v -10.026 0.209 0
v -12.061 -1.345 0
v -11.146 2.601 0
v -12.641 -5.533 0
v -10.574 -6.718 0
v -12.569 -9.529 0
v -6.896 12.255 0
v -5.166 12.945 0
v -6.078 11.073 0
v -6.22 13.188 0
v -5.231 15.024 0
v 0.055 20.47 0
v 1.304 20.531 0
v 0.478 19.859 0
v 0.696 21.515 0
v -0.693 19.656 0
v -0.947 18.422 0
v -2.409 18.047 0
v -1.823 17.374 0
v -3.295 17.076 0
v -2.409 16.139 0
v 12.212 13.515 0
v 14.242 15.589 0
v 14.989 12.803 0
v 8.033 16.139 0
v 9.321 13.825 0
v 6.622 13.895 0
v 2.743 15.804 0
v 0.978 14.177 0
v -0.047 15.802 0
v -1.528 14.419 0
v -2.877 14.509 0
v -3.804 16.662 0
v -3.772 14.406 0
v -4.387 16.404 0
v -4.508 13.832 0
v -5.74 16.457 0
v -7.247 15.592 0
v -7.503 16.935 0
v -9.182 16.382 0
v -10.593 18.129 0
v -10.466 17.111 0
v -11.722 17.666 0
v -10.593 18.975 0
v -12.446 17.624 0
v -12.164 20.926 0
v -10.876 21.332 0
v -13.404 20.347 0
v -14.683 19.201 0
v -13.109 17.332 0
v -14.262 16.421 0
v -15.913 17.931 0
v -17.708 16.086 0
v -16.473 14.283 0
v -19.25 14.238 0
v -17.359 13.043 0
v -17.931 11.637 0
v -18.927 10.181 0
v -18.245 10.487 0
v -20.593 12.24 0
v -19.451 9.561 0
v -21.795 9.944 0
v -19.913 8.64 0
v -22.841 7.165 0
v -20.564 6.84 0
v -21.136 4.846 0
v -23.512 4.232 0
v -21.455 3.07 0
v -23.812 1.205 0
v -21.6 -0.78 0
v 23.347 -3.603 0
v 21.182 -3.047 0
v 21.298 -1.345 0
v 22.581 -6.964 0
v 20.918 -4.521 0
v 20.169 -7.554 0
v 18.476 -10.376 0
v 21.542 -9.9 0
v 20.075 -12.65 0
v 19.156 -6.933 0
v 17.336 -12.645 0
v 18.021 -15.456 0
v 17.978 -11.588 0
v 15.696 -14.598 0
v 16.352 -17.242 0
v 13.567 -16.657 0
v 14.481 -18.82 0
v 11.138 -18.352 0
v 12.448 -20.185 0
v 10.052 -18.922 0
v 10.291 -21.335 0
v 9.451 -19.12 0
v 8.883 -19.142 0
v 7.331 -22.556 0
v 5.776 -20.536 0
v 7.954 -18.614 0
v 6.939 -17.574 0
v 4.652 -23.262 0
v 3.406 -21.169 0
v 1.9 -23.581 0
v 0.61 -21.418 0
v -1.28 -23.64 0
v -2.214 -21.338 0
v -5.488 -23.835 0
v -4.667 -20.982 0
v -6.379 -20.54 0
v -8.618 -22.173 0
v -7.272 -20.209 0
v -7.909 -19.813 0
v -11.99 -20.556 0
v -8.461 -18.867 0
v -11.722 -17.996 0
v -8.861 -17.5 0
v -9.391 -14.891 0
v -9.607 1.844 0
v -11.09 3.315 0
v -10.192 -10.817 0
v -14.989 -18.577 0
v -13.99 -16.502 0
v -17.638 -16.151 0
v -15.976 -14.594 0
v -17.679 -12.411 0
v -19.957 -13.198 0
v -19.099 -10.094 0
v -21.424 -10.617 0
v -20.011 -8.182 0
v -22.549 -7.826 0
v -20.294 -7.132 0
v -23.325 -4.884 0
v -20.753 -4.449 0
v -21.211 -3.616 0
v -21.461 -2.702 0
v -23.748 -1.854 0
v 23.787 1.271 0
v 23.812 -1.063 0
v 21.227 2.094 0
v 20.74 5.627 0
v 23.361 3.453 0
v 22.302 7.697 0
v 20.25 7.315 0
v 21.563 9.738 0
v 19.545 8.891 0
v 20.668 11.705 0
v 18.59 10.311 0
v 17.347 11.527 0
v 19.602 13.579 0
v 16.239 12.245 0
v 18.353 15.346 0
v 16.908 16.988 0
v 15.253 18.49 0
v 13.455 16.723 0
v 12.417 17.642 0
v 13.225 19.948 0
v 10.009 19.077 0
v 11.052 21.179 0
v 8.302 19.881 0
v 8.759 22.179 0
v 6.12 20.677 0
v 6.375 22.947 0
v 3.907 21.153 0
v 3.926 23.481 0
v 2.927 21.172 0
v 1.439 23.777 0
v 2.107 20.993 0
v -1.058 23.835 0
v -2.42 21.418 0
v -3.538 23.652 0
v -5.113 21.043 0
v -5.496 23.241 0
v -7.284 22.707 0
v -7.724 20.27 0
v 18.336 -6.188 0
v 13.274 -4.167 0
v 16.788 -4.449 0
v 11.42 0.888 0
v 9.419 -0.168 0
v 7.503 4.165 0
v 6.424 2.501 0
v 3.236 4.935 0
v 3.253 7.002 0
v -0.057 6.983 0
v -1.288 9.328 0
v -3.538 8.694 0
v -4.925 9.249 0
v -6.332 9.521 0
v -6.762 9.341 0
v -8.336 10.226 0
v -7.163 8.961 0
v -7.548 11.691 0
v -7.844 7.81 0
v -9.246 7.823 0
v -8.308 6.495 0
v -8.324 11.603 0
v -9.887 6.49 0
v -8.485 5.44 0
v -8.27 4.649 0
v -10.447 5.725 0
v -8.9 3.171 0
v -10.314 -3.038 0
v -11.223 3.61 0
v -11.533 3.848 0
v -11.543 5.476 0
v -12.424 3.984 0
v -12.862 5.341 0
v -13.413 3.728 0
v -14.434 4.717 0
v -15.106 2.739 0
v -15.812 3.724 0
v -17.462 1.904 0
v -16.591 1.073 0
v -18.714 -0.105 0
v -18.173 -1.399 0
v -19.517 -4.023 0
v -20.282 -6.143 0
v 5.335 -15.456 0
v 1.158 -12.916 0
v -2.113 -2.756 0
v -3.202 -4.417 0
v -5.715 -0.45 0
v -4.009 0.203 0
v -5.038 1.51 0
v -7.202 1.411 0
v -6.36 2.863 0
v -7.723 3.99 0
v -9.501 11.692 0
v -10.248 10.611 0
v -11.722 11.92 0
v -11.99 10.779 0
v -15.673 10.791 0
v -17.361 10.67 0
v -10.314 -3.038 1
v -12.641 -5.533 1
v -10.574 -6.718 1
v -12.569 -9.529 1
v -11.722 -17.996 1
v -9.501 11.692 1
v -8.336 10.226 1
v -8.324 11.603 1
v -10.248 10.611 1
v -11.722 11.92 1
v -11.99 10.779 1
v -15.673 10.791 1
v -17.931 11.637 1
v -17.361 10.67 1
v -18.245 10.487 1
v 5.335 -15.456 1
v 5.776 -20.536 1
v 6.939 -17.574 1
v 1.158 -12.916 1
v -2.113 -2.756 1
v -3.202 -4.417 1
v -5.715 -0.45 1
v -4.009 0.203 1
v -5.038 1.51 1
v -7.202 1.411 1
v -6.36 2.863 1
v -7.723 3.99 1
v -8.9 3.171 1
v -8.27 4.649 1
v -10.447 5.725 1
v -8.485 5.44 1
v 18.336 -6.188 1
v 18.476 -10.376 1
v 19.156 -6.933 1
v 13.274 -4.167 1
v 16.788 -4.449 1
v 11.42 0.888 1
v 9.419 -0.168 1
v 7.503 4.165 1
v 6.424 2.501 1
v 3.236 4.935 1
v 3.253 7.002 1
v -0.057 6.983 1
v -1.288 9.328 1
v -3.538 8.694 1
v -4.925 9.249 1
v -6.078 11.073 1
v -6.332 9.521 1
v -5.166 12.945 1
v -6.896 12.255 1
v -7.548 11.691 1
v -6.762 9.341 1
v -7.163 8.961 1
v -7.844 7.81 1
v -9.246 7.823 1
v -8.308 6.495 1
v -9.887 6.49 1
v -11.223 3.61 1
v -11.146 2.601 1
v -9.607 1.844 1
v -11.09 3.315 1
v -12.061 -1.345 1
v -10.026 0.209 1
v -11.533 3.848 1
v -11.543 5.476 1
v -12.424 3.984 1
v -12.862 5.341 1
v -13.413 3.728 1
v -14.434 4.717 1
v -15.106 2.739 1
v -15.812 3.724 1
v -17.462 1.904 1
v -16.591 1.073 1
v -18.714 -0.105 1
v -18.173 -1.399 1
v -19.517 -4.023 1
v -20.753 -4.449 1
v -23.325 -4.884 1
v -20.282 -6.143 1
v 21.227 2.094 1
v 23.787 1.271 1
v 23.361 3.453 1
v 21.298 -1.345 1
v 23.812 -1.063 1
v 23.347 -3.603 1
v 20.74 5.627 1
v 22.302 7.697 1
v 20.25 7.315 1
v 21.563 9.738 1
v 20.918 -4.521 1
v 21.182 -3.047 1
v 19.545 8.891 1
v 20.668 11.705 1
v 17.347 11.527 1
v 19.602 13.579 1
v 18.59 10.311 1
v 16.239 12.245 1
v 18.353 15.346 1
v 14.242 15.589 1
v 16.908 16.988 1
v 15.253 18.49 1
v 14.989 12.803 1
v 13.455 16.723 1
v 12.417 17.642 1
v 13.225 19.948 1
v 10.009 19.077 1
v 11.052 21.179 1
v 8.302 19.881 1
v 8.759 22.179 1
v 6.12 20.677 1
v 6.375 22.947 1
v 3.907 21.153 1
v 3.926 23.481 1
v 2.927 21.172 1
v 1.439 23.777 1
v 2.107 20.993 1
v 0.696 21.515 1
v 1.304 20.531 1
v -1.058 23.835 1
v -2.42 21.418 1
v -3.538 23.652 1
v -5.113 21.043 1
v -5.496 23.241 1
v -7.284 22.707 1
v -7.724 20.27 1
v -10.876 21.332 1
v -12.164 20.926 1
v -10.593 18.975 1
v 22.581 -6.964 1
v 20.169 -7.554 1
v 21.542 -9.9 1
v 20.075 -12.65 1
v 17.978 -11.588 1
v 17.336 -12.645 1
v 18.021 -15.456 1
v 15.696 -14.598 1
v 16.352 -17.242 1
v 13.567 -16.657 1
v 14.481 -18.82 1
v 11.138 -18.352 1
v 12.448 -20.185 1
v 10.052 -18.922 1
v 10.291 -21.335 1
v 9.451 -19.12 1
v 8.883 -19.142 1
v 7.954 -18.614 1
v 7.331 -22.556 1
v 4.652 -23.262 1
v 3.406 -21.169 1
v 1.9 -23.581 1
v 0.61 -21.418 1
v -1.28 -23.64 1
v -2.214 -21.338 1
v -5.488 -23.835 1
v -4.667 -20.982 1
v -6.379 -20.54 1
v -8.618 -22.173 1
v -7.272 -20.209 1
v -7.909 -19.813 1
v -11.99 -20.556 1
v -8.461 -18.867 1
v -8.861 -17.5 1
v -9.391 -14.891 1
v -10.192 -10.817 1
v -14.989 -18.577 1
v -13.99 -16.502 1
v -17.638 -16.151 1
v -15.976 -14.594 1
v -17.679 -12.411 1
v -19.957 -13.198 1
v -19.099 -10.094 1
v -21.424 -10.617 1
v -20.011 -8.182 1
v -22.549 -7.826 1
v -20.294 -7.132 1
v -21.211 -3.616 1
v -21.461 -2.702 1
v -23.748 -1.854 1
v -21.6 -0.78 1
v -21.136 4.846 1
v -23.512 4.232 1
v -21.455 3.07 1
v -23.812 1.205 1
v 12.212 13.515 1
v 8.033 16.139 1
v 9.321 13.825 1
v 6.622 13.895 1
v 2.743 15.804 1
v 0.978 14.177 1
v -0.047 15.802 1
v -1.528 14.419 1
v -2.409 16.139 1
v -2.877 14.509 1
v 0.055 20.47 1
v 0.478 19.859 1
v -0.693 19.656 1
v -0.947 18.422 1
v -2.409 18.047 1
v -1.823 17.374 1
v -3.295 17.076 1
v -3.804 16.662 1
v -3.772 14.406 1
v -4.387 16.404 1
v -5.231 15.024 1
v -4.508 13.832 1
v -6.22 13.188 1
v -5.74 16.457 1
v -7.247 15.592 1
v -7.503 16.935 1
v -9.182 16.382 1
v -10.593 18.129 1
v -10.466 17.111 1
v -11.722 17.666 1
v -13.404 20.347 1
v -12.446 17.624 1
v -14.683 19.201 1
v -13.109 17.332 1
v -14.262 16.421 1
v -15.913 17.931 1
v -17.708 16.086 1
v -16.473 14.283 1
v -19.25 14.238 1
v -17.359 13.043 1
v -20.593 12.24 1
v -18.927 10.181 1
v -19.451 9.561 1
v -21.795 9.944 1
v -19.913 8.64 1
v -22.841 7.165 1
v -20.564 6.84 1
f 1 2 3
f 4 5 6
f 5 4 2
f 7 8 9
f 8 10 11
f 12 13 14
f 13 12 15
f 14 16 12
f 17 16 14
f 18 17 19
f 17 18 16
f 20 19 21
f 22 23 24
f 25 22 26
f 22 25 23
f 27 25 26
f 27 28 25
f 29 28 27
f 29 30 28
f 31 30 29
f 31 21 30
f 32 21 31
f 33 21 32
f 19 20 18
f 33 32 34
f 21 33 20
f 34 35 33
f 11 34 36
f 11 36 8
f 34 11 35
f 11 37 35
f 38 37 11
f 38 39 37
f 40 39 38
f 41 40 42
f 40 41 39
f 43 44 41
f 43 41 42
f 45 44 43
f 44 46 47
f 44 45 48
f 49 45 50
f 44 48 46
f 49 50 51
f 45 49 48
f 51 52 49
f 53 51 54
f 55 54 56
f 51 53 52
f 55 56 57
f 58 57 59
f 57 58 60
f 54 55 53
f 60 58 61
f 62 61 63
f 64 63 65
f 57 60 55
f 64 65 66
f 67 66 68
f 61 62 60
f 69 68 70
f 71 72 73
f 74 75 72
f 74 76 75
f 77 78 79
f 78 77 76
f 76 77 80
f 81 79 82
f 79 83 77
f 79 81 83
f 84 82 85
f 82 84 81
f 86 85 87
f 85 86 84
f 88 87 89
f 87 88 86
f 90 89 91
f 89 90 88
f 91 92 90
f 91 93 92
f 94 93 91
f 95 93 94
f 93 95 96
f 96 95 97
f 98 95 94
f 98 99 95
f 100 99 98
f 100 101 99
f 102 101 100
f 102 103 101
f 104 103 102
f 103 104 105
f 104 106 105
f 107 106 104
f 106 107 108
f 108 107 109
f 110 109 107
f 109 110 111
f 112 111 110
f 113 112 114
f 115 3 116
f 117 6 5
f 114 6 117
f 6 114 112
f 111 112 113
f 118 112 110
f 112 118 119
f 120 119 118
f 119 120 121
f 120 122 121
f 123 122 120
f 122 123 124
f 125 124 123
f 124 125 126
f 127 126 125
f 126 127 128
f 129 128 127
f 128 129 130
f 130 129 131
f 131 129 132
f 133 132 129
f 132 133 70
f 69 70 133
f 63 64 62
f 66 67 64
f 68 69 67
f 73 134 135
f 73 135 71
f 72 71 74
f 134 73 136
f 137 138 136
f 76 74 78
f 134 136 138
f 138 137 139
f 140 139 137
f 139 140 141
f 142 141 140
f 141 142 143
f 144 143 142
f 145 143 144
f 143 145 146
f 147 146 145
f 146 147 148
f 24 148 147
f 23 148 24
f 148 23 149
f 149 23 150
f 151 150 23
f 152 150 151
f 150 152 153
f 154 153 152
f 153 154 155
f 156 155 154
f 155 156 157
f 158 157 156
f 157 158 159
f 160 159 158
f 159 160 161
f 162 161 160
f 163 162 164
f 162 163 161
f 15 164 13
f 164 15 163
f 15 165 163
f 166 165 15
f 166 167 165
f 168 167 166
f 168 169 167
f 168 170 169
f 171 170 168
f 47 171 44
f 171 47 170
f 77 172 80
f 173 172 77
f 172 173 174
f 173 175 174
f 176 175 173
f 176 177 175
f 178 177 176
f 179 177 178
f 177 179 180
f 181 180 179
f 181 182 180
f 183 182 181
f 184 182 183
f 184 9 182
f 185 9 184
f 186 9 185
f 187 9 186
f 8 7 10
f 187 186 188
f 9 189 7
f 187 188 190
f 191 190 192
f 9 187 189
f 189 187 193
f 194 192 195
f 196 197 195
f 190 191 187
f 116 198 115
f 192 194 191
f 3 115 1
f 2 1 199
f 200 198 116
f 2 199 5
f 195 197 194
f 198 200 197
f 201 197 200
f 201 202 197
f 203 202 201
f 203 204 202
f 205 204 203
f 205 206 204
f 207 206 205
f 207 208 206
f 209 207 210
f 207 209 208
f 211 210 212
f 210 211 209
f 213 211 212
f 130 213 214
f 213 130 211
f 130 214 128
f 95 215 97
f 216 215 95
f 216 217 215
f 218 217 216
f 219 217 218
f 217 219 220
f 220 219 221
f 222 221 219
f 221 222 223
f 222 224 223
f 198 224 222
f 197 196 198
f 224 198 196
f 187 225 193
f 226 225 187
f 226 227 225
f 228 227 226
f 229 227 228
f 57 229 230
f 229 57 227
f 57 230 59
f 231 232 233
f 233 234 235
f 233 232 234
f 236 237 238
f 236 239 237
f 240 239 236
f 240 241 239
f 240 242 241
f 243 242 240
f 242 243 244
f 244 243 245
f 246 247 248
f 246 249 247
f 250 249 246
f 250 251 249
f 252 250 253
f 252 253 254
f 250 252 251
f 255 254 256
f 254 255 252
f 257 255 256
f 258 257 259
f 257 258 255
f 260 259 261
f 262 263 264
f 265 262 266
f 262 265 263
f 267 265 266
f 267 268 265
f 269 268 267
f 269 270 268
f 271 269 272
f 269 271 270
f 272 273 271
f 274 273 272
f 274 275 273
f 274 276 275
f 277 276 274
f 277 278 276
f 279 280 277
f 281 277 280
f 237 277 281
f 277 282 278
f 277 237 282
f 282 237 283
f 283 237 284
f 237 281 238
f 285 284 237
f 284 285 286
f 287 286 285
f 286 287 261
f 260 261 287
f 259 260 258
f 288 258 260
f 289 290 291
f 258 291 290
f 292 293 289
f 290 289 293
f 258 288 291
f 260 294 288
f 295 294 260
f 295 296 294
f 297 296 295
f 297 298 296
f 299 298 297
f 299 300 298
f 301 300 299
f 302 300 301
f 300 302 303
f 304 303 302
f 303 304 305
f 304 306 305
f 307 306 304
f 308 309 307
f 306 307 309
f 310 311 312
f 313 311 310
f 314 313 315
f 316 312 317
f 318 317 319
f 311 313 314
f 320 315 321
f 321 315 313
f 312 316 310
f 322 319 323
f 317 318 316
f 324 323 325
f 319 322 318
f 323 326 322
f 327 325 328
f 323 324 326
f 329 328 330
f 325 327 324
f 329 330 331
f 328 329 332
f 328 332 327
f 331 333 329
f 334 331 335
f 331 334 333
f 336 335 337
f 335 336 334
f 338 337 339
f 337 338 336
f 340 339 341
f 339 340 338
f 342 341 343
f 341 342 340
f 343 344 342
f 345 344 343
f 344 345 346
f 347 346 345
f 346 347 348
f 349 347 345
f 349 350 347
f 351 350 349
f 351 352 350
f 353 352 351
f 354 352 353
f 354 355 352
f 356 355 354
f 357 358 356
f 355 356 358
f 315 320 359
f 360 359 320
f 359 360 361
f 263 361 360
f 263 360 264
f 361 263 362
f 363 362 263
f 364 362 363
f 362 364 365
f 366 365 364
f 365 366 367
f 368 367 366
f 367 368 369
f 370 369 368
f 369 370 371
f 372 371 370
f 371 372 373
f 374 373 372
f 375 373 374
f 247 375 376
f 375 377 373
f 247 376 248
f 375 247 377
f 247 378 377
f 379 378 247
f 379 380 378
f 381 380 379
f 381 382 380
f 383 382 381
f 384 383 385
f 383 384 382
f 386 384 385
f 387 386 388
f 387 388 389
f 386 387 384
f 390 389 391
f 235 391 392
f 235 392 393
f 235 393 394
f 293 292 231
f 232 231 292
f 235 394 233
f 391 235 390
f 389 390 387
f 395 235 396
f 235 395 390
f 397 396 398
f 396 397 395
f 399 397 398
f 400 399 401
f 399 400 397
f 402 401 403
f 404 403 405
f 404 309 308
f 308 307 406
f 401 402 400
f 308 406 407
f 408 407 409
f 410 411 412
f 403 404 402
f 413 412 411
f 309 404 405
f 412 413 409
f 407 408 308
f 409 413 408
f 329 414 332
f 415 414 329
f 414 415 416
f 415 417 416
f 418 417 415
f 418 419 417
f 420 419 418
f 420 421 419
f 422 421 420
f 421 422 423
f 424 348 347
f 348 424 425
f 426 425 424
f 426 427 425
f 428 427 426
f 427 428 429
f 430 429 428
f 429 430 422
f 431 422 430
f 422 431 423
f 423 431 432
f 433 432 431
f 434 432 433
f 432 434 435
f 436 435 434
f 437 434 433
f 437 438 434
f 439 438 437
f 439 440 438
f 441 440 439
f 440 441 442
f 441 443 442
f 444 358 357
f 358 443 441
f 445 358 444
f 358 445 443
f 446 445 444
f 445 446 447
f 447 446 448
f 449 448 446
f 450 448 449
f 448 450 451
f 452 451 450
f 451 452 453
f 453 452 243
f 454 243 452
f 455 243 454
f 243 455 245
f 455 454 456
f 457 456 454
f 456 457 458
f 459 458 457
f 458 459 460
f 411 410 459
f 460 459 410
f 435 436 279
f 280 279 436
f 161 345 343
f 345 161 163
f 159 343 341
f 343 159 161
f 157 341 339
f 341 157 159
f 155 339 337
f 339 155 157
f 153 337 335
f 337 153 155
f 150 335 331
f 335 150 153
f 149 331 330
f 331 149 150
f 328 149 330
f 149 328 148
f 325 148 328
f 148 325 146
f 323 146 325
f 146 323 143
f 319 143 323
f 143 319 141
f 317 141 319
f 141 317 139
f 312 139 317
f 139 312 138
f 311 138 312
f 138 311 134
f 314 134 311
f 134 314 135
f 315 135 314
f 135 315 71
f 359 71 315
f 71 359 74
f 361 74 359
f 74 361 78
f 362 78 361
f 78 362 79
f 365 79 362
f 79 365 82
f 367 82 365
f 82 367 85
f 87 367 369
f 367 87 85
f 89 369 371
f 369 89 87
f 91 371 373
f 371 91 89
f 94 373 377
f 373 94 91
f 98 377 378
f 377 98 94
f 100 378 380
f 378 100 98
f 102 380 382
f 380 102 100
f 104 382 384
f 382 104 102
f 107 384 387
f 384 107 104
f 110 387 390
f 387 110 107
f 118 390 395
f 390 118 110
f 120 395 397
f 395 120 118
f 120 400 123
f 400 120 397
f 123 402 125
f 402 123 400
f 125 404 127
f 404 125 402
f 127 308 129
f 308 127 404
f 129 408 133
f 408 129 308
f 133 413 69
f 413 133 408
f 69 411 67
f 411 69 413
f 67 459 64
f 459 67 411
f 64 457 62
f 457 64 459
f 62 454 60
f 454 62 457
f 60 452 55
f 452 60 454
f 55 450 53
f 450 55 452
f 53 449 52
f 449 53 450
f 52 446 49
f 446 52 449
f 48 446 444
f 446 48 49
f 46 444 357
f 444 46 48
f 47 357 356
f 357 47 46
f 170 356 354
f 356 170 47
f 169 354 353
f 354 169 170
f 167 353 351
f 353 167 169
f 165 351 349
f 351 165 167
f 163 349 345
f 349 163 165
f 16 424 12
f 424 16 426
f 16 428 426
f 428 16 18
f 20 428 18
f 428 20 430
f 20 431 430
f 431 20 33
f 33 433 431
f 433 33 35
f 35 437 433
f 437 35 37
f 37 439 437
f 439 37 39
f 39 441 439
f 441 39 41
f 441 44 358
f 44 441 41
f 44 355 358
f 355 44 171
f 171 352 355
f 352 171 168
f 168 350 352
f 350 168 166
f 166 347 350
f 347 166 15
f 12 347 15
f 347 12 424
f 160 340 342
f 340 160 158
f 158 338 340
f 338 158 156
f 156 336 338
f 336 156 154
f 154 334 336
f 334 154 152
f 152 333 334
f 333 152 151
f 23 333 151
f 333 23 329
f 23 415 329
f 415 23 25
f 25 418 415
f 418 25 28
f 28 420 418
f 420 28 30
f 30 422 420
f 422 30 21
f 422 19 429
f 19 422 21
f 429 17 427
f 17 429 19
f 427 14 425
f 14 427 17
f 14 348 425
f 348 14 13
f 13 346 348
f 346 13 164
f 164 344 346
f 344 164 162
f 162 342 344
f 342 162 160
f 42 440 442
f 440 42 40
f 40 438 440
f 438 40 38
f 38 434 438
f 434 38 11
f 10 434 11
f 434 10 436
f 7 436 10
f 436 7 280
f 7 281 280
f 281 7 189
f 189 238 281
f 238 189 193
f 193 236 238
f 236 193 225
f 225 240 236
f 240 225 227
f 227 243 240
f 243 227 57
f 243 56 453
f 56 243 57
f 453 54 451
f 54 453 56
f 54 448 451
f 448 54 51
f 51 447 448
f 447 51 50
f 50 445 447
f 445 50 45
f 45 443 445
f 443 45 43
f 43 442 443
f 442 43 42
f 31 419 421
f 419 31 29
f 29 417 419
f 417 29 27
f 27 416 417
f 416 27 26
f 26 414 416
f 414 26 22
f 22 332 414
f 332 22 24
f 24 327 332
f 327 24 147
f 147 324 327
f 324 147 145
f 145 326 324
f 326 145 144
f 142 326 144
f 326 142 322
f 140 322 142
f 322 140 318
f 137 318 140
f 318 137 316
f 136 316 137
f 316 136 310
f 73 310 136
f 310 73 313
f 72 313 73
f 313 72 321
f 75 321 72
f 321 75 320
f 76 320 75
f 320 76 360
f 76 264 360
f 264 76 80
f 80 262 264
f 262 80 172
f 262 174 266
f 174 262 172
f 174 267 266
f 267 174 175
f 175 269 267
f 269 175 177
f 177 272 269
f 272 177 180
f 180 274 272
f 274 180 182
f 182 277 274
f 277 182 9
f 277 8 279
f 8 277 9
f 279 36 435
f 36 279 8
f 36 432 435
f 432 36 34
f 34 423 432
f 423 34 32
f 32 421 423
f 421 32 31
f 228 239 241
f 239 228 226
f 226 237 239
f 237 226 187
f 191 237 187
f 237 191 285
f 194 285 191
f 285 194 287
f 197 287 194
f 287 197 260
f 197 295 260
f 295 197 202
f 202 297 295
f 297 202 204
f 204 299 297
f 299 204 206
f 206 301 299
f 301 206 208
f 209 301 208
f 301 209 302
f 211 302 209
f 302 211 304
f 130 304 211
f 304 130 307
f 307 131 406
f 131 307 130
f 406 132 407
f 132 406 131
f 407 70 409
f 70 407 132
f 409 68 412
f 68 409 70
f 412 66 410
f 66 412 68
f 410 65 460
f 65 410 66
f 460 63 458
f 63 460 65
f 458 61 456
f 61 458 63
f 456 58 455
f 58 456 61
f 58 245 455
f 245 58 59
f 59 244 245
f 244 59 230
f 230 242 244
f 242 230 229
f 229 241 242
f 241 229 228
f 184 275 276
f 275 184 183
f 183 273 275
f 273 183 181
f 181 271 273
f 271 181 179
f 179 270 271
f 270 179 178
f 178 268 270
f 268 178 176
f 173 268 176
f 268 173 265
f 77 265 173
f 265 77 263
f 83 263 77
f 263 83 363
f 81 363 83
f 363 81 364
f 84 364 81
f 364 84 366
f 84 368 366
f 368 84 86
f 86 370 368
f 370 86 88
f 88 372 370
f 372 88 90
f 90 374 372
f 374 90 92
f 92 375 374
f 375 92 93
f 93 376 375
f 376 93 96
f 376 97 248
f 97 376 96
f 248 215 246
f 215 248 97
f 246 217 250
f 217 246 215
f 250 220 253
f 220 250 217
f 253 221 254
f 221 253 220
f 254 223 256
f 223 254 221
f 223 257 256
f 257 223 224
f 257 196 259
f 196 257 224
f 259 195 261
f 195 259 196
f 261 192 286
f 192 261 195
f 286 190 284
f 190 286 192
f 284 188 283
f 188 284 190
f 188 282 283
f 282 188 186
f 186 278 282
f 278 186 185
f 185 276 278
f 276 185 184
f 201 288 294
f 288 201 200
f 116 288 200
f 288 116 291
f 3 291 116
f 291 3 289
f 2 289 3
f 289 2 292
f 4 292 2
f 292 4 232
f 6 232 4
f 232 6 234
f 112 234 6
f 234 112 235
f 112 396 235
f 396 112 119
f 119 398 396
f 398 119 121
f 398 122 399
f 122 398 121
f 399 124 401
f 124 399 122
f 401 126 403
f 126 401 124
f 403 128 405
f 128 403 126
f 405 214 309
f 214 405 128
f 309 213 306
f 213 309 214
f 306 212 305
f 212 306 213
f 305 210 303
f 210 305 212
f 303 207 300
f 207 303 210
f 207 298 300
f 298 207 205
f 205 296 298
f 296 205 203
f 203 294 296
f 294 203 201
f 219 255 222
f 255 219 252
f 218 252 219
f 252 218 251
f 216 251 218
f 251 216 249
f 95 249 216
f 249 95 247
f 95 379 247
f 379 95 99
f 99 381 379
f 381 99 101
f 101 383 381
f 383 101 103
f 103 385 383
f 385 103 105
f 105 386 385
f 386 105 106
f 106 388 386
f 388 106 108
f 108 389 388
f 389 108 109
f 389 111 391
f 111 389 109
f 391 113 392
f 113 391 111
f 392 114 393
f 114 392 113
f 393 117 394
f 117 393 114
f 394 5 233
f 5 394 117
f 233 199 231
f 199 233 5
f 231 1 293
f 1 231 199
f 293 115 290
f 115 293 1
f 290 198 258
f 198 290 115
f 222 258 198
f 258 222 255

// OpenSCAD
// Module names are of the form poly_<inkscape-path-id>().  As a result,
// you can associate a polygon in this OpenSCAD program with the corresponding
// SVG element in the Inkscape document by looking for the XML element with
// the attribute id="inkscape-path-id".

// fudge value is used to ensure that subtracted solids are a tad taller
// in the z dimension than the polygon being subtracted from.  This helps
// keep the resulting .stl file manifold.
fudge = 0.1;

module poly_Selection(h)
{
  scale([25.4/90, -25.4/90, 1]) union()
  {
    difference()
    {
       linear_extrude(height=h)
         polygon([[54.044688,-65.514971],[59.909023,-60.194951],[65.030625,-54.376064],[69.456133,-48.116318],[73.232187,-41.473721],[76.405430,-34.506279],[79.022500,-27.272002],[82.774688,-12.234971],[84.283438,-4.504971],[84.374688,3.765029],[82.724688,12.765029],[80.011094,24.676904],[76.330937,35.077529],[71.130156,44.821904],[63.854687,54.765029],[57.939531,61.095186],[51.310937,66.683779],[44.106719,71.520498],[36.464688,75.595029],[25.974688,79.923154],[16.482187,82.425029],[6.730938,83.554404],[-4.535312,83.765029],[-19.445312,84.455029],[-30.535312,78.565029],[-42.484844,72.836904],[-53.111562,65.822529],[-62.495156,57.229404],[-70.715312,46.765029],[-75.912812,37.619990],[-79.897187,27.728467],[-82.648750,17.305850],[-84.147812,6.567529],[-84.374687,-4.271104],[-83.309687,-14.994658],[-80.933125,-25.387744],[-77.225312,-35.234971],[-72.967812,-43.369346],[-68.207812,-50.449971],[-62.746562,-56.998096],[-56.385312,-63.534971],[-52.026562,-68.036221],[-47.495312,-72.094971],[-43.101562,-74.147471],[-38.535312,-75.584971],[-25.809062,-80.456221],[-19.473594,-82.350439],[-12.535312,-83.804971],[-3.747285,-84.455029],[5.100156,-84.250439],[13.910801,-83.199053],[22.588438,-81.308721],[31.036855,-78.587295],[39.159844,-75.042627],[46.861191,-70.682568],[54.044688,-65.514971]]);
       translate([0, 0, -fudge])
         linear_extrude(height=h+2*fudge)
           polygon([[-37.535312,-67.234971],[-37.535312,-64.234971],[-26.585313,-60.006221],[-20.339687,-58.313252],[-15.545312,-58.124971],[-13.478281,-59.038564],[-11.676563,-60.506221],[-8.535312,-63.944971],[-2.454062,-69.647471],[0.193281,-72.531533],[2.464688,-76.234971],[-8.573594,-75.889033],[-18.116563,-74.562471],[-27.368906,-71.822158],[-37.535312,-67.234971]]);
       translate([0, 0, -fudge])
         linear_extrude(height=h+2*fudge)
           polygon([[35.464688,-67.594971],[29.417656,-70.443252],[21.685938,-73.266221],[13.843594,-74.951064],[10.372832,-75.018936],[7.464688,-74.384971],[4.620938,-72.749189],[1.694688,-70.366221],[-3.355312,-65.274971],[-6.459062,-61.559971],[-8.535312,-57.184971],[-0.167969,-55.992471],[9.720938,-55.999971],[28.464688,-57.184971],[50.464688,-55.234971],[47.675156,-59.253096],[43.995938,-62.509971],[35.464688,-67.594971]]);
       translate([0, 0, -fudge])
         linear_extrude(height=h+2*fudge)
           polygon([[-32.535312,-58.044971],[-37.084062,-60.631221],[-41.535312,-62.594971],[-44.100312,-62.447314],[-46.447812,-61.413721],[-50.535312,-58.184971],[-58.370312,-50.609971],[-61.509687,-46.214971],[-63.535312,-41.234971],[-41.535312,-42.234971],[-33.664062,-41.428721],[-29.493594,-41.111377],[-26.745312,-41.424971],[-24.435937,-43.422158],[-22.040312,-46.729971],[-18.535312,-53.234971],[-25.677812,-55.246221],[-32.535312,-58.044971]]);
       translate([0, 0, -fudge])
         linear_extrude(height=h+2*fudge)
           polygon([[75.464688,4.765029],[75.212188,-7.421221],[73.489687,-19.937471],[71.751406,-25.919736],[69.254688,-31.504971],[65.869219,-36.533330],[61.464688,-40.844971],[57.540332,-43.389561],[53.109844,-45.363564],[43.270938,-47.886221],[33.028906,-48.985752],[23.464688,-49.234971],[3.464688,-50.234971],[-5.415312,-51.089971],[-10.195625,-51.410596],[-13.365312,-51.044971],[-15.975000,-49.011221],[-18.305312,-45.867471],[-21.535312,-39.234971],[-4.563437,-33.051689],[11.527188,-24.808721],[26.586562,-14.756377],[40.464688,-3.144971],[59.484688,15.765029],[64.968438,21.925029],[67.875781,24.565342],[71.464688,26.765029],[74.117188,16.020029],[75.053437,10.795654],[75.464688,4.765029]]);
       translate([0, 0, -fudge])
         linear_extrude(height=h+2*fudge)
           polygon([[-55.535312,-38.234971],[-61.514062,-37.807471],[-64.646406,-37.157783],[-67.065312,-36.074971],[-68.922187,-33.876221],[-70.557812,-30.612471],[-72.865312,-24.234971],[-74.890000,-17.169971],[-76.020312,-10.877471],[-76.535312,2.765029],[-76.044062,9.572529],[-75.155781,12.814092],[-73.535312,15.765029],[-66.310312,0.373779],[-61.871875,-6.744814],[-56.025312,-13.194971],[-51.145312,-16.712471],[-45.575312,-18.924971],[-40.901562,-19.402471],[-37.015312,-20.284971],[-35.032344,-22.996533],[-32.761562,-27.719971],[-29.535312,-36.234971],[-36.311875,-37.596533],[-42.482812,-38.194971],[-55.535312,-38.234971]]);
       translate([0, 0, -fudge])
         linear_extrude(height=h+2*fudge)
           polygon([[47.034688,14.765029],[33.374688,0.595029],[22.760937,-8.861221],[11.464688,-17.484971],[-0.201562,-24.741221],[-12.535312,-30.804971],[-17.451562,-32.772471],[-22.435312,-33.734971],[-23.958359,-33.098877],[-25.379687,-31.751221],[-27.795312,-27.674971],[-29.438437,-23.013721],[-30.065312,-19.274971],[-29.302187,-16.474502],[-27.365313,-14.136221],[-22.535312,-10.144971],[-17.850781,-5.350752],[-14.204062,-0.718721],[-7.485312,9.765029],[18.904688,54.765029],[24.585938,62.270029],[28.184531,65.955967],[31.474688,67.825029],[33.486719,67.747529],[35.615938,67.047529],[39.464688,65.025029],[48.072188,59.020029],[55.614688,51.725029],[61.428438,44.803779],[63.702031,41.058623],[65.464688,36.765029],[47.034688,14.765029]]);
       translate([0, 0, -fudge])
         linear_extrude(height=h+2*fudge)
           polygon([[-44.535312,33.765029],[-44.790312,19.606279],[-42.735312,4.765029],[-39.495312,-9.214971],[-39.295312,-11.747471],[-39.768125,-12.792471],[-40.865312,-13.634971],[-44.021875,-14.116377],[-47.525312,-13.211221],[-53.525312,-9.704971],[-58.785781,-3.803408],[-64.394062,4.957529],[-69.152969,14.254717],[-71.865312,21.765029],[-71.906719,25.271592],[-70.906562,28.990029],[-67.675312,35.765029],[-62.643125,43.977686],[-56.607812,51.711279],[-49.571250,58.471748],[-41.535312,63.765029],[-44.535312,33.765029]]);
       translate([0, 0, -fudge])
         linear_extrude(height=h+2*fudge)
           polygon([[-36.545312,10.765029],[-37.465312,23.805029],[-36.112813,38.326279],[-33.275312,52.765029],[-31.396562,62.006279],[-29.980469,66.851436],[-28.025312,70.205029],[-25.765937,71.607061],[-22.602812,72.781279],[-16.535312,74.345029],[-7.845937,75.607061],[2.159688,75.891279],[12.067813,75.007373],[20.464688,72.765029],[4.104688,45.765029],[-11.345312,15.652529],[-20.248750,1.594717],[-25.519258,-5.000010],[-31.535312,-11.234971],[-34.039375,-6.533252],[-35.525312,-0.741221],[-36.545312,10.765029]]);
    }
  }
}

module basketball(h)
{

poly_Selection(h);
}

basketball(1);
